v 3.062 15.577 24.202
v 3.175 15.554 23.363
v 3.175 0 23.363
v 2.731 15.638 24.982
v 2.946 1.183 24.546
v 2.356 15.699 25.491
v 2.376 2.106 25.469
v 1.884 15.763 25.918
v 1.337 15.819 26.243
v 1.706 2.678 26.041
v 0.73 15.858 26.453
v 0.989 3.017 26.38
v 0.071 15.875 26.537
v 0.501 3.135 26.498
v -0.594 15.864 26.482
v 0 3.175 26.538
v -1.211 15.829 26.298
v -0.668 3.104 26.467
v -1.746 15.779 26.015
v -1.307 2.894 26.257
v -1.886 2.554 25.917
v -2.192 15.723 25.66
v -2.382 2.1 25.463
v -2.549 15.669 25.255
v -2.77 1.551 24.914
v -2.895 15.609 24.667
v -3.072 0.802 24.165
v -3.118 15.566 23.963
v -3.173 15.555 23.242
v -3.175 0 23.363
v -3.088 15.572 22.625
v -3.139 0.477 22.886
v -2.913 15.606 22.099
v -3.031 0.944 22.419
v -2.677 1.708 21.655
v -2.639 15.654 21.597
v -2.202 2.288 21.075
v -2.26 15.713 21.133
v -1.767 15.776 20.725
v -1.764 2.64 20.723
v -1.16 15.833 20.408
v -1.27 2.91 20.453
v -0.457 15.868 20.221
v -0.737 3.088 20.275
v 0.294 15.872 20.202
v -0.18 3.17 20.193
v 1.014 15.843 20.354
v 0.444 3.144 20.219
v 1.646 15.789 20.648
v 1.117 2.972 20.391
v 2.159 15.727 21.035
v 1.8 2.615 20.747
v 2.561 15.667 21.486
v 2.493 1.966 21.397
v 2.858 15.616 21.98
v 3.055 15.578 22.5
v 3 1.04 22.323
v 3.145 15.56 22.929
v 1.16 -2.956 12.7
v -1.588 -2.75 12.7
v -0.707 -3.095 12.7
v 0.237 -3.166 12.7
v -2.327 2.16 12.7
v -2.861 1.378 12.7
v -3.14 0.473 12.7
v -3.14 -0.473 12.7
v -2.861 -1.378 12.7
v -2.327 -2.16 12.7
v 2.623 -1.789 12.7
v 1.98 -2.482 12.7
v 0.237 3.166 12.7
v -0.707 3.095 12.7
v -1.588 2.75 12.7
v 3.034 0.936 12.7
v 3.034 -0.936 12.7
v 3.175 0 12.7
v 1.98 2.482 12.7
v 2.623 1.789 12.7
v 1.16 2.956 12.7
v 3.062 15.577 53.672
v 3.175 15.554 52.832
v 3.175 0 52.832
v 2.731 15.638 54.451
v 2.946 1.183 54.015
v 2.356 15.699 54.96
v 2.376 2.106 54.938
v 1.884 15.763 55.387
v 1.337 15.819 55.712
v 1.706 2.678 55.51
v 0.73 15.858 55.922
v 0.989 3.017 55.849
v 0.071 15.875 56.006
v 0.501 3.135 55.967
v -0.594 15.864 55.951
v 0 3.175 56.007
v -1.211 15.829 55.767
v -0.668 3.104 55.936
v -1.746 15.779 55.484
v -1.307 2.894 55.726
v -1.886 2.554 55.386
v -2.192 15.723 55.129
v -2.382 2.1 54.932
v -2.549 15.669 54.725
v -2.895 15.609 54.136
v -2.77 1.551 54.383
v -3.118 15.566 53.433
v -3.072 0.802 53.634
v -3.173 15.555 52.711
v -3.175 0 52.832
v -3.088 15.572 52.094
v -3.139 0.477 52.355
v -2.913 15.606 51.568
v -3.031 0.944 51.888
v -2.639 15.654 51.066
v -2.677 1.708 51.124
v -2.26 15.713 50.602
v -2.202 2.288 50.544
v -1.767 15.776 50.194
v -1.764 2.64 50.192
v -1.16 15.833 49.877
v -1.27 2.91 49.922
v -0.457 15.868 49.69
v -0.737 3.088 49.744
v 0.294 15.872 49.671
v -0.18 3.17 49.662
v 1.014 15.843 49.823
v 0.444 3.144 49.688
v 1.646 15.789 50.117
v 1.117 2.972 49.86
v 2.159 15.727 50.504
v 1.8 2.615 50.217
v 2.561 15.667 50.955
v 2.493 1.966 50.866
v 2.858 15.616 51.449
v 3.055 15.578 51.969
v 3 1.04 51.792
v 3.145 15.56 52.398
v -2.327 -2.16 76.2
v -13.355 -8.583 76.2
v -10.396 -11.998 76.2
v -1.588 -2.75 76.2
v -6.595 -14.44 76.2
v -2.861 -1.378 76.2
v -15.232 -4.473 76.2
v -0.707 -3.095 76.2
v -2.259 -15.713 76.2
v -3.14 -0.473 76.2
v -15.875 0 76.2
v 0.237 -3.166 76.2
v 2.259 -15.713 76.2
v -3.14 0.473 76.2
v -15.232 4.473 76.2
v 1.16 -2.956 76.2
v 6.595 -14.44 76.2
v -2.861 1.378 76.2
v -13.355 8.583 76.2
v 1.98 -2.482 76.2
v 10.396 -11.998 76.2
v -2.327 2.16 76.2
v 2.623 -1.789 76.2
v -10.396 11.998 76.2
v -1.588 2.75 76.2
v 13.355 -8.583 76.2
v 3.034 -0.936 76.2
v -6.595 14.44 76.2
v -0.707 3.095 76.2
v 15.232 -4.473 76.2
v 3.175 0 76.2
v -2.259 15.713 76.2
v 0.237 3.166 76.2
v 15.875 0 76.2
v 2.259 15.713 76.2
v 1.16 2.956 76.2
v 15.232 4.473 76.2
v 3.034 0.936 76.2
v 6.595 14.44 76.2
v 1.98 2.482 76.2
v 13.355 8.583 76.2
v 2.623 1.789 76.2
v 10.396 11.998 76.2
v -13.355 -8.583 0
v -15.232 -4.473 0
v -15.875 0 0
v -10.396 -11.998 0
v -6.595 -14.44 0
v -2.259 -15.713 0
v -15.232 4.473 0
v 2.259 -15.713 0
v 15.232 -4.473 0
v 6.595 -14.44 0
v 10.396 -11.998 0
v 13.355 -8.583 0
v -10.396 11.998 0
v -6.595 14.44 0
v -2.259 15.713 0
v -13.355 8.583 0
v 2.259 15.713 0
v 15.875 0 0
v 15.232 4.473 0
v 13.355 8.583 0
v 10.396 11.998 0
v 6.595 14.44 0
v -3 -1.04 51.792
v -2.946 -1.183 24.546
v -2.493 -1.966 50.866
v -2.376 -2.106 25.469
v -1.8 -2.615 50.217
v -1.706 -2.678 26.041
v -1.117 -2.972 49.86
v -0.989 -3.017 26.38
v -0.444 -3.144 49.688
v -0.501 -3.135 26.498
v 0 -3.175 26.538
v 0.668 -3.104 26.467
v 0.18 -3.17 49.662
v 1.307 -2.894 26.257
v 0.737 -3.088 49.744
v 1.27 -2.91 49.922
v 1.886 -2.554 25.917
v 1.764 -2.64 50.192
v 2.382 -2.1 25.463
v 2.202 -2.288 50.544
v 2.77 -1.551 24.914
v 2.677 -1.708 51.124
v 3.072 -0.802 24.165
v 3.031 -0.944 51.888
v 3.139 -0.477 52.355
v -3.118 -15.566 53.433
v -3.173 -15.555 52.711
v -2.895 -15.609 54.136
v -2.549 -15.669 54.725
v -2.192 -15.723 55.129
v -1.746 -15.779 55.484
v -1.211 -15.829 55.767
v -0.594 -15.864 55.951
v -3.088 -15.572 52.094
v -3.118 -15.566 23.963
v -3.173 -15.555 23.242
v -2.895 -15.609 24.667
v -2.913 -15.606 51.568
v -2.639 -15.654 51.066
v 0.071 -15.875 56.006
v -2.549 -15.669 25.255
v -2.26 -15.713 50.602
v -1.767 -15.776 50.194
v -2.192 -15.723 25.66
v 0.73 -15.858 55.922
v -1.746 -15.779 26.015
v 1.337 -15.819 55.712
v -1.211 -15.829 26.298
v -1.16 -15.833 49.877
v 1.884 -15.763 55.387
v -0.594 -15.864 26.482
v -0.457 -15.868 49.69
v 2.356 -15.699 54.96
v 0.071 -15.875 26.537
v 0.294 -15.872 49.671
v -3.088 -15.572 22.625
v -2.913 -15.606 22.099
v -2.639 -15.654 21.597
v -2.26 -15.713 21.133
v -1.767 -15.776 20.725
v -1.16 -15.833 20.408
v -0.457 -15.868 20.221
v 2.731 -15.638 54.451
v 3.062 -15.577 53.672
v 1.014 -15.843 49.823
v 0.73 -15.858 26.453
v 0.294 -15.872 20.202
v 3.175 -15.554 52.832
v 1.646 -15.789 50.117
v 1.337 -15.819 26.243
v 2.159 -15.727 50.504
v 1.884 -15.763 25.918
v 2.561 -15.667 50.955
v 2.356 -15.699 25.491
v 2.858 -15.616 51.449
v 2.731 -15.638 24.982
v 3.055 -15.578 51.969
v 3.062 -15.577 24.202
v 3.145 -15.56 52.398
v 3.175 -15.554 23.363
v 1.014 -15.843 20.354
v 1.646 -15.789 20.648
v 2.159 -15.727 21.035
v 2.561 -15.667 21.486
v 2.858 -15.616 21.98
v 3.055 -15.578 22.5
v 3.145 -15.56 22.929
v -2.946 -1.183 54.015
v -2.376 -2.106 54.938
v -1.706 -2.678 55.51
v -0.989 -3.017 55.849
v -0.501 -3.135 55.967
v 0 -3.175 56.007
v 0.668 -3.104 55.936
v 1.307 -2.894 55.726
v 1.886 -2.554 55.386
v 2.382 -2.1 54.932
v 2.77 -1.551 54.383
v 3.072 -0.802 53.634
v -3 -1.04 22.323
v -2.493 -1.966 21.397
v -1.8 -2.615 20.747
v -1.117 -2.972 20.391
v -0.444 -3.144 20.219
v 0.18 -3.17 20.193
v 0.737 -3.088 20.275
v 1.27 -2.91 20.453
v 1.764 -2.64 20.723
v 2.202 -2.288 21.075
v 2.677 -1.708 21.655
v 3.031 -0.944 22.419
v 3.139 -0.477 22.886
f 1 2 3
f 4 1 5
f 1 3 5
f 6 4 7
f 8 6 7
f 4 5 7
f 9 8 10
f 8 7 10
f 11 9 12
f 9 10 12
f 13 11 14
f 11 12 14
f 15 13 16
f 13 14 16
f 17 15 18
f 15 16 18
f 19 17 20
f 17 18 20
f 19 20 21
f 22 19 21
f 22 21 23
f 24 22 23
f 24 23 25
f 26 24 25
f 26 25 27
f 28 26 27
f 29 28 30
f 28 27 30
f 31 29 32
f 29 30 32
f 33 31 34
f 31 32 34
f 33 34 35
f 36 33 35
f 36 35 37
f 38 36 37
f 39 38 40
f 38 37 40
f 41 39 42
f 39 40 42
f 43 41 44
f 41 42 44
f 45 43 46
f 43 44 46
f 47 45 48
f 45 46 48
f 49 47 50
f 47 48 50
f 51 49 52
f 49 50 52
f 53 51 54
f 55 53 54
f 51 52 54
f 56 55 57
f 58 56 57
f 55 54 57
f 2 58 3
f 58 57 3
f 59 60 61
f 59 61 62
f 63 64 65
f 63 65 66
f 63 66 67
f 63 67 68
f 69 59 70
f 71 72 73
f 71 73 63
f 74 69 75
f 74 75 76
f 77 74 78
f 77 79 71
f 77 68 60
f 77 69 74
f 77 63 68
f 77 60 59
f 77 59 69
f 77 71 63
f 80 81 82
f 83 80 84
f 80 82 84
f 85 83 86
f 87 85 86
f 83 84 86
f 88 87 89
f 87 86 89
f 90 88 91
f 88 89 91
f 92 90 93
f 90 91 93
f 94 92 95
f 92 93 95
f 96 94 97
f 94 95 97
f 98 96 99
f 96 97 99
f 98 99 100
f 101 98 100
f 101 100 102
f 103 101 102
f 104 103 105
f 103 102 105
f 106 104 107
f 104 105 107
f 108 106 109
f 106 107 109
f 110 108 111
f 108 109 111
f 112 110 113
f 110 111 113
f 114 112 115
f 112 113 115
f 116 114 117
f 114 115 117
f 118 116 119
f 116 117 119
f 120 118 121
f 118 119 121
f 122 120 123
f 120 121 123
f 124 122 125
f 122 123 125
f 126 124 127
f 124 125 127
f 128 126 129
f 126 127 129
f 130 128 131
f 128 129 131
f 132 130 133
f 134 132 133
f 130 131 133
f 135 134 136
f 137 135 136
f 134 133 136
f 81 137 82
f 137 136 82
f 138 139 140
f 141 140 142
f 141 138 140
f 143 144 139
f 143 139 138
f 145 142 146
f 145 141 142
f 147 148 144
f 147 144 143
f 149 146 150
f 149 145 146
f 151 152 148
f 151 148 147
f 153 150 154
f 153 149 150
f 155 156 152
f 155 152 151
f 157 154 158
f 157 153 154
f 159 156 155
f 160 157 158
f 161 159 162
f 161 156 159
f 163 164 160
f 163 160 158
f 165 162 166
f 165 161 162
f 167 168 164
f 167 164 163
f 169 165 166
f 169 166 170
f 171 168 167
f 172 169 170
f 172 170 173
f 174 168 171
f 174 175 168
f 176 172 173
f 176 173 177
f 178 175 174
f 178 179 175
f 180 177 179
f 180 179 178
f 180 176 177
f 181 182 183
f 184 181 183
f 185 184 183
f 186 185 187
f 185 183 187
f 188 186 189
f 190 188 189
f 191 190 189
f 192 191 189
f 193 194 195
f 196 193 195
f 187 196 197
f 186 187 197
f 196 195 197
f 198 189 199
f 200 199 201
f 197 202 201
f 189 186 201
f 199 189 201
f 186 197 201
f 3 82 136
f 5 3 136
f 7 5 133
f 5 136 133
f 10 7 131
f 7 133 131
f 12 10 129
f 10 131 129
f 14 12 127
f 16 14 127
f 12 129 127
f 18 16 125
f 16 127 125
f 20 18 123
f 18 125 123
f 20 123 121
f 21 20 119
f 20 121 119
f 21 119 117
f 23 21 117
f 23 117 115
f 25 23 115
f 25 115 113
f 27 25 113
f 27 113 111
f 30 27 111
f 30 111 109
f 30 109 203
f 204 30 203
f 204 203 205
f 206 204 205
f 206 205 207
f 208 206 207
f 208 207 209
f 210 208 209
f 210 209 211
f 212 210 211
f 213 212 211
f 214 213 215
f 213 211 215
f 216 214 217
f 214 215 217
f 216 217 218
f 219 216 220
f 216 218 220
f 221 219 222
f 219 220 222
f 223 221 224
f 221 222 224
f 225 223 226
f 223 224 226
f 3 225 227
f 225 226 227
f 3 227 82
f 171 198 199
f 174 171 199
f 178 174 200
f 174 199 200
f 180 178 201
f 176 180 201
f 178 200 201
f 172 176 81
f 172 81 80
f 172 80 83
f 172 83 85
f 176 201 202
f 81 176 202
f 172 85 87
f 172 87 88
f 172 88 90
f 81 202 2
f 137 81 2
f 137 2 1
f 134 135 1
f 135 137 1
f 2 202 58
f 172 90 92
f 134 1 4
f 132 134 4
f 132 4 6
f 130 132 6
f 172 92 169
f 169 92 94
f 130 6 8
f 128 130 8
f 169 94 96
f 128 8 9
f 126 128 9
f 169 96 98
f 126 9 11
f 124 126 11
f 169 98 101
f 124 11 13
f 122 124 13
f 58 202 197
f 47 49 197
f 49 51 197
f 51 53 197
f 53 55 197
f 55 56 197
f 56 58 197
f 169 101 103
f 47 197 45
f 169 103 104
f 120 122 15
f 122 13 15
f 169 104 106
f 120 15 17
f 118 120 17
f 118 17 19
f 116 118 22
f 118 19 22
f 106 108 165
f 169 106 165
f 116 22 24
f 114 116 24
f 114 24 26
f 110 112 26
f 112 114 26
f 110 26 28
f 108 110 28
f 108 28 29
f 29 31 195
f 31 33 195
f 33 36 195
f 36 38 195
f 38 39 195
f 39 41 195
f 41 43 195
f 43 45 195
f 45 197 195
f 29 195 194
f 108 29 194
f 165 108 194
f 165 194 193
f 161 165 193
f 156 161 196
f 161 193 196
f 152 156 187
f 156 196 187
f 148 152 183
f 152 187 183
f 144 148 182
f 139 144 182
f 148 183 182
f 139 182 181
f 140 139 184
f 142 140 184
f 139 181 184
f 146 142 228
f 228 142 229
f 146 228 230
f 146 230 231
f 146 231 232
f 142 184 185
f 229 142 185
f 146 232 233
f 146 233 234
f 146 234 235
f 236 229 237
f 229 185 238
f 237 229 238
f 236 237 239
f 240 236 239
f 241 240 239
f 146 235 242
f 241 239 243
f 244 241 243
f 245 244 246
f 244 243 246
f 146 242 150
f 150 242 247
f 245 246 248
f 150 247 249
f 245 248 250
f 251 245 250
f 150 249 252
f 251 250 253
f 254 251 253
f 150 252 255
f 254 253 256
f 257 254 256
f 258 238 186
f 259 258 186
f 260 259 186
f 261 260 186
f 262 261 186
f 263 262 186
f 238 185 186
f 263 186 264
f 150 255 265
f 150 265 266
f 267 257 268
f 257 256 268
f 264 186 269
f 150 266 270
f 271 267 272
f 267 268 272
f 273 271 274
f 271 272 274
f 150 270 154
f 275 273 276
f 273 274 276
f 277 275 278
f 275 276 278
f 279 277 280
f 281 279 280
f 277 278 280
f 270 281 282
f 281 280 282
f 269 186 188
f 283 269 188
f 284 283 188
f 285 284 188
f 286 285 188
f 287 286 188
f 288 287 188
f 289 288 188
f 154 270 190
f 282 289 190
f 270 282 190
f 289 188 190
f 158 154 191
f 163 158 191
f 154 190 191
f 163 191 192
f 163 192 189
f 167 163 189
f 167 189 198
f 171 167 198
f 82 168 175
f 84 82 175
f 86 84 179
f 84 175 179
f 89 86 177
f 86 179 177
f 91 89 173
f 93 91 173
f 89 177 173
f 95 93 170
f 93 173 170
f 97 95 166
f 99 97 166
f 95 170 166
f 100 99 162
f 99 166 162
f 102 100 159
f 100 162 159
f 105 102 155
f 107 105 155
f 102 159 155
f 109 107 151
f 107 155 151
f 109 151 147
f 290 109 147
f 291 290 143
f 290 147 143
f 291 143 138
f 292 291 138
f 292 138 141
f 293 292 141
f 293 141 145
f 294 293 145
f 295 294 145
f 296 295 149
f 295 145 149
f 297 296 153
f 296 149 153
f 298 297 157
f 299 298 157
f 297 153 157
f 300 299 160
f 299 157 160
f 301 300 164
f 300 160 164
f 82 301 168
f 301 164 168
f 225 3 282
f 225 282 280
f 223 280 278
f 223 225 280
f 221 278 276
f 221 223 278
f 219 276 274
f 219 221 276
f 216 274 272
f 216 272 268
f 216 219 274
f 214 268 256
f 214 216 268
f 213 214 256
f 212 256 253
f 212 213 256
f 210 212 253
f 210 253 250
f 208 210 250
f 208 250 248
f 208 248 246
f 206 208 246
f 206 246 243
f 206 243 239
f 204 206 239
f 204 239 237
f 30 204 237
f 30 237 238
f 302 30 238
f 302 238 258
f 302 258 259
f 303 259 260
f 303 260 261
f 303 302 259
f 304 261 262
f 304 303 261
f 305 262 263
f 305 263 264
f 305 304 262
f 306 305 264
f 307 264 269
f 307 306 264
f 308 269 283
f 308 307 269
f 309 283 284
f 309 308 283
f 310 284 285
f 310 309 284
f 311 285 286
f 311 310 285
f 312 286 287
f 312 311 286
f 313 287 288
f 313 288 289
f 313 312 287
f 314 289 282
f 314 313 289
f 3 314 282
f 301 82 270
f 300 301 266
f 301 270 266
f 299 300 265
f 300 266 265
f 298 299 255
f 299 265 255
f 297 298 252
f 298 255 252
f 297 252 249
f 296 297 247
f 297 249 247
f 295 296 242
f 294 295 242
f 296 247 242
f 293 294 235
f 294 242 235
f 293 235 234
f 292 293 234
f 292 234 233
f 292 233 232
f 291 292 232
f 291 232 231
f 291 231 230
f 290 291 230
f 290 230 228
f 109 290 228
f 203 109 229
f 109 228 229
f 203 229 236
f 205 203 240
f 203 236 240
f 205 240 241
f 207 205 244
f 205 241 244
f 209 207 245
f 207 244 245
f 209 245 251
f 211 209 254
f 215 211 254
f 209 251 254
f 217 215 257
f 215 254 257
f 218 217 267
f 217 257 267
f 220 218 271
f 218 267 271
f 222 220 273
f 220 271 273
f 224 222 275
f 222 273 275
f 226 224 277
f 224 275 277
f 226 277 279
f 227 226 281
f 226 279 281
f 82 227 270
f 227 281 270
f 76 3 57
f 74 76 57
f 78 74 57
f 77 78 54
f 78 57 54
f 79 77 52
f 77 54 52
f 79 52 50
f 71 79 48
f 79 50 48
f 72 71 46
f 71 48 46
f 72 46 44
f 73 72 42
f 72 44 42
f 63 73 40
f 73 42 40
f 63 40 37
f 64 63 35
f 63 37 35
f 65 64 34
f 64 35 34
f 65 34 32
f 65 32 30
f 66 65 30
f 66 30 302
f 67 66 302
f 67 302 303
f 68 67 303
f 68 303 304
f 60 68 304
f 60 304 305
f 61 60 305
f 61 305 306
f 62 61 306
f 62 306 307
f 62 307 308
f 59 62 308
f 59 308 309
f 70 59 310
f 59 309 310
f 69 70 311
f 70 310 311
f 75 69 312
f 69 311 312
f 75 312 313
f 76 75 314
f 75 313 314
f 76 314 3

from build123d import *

# Parameters (mm, degrees)
F0_R     = 15.875
F1_DEPTH = 76.2
F2_R     = 3.175
F3_DEPTH = 63.5
F4_R     = 3.175
F5_DEPTH = 25.4


with BuildPart() as f1:
    # F0 (on Top) → F1 (new body)
    with BuildSketch(Plane.XY):
        Circle(F0_R)
    extrude(amount=F1_DEPTH)

    # F2 (on face) → F3 (cut)
    with BuildSketch(Plane.XY.offset(76.2)):
        Circle(F2_R)
    extrude(amount=-F3_DEPTH, mode=Mode.SUBTRACT)

    # F4 (on Front) → F5 (cut, symmetric)
    with BuildSketch(Plane.XZ):
        with Locations((0, 23.36292)):
            Circle(F4_R)
        with Locations((0, 52.832)):
            Circle(F4_R)
    extrude(amount=F5_DEPTH, both=True, mode=Mode.SUBTRACT)


solid = f1.part
